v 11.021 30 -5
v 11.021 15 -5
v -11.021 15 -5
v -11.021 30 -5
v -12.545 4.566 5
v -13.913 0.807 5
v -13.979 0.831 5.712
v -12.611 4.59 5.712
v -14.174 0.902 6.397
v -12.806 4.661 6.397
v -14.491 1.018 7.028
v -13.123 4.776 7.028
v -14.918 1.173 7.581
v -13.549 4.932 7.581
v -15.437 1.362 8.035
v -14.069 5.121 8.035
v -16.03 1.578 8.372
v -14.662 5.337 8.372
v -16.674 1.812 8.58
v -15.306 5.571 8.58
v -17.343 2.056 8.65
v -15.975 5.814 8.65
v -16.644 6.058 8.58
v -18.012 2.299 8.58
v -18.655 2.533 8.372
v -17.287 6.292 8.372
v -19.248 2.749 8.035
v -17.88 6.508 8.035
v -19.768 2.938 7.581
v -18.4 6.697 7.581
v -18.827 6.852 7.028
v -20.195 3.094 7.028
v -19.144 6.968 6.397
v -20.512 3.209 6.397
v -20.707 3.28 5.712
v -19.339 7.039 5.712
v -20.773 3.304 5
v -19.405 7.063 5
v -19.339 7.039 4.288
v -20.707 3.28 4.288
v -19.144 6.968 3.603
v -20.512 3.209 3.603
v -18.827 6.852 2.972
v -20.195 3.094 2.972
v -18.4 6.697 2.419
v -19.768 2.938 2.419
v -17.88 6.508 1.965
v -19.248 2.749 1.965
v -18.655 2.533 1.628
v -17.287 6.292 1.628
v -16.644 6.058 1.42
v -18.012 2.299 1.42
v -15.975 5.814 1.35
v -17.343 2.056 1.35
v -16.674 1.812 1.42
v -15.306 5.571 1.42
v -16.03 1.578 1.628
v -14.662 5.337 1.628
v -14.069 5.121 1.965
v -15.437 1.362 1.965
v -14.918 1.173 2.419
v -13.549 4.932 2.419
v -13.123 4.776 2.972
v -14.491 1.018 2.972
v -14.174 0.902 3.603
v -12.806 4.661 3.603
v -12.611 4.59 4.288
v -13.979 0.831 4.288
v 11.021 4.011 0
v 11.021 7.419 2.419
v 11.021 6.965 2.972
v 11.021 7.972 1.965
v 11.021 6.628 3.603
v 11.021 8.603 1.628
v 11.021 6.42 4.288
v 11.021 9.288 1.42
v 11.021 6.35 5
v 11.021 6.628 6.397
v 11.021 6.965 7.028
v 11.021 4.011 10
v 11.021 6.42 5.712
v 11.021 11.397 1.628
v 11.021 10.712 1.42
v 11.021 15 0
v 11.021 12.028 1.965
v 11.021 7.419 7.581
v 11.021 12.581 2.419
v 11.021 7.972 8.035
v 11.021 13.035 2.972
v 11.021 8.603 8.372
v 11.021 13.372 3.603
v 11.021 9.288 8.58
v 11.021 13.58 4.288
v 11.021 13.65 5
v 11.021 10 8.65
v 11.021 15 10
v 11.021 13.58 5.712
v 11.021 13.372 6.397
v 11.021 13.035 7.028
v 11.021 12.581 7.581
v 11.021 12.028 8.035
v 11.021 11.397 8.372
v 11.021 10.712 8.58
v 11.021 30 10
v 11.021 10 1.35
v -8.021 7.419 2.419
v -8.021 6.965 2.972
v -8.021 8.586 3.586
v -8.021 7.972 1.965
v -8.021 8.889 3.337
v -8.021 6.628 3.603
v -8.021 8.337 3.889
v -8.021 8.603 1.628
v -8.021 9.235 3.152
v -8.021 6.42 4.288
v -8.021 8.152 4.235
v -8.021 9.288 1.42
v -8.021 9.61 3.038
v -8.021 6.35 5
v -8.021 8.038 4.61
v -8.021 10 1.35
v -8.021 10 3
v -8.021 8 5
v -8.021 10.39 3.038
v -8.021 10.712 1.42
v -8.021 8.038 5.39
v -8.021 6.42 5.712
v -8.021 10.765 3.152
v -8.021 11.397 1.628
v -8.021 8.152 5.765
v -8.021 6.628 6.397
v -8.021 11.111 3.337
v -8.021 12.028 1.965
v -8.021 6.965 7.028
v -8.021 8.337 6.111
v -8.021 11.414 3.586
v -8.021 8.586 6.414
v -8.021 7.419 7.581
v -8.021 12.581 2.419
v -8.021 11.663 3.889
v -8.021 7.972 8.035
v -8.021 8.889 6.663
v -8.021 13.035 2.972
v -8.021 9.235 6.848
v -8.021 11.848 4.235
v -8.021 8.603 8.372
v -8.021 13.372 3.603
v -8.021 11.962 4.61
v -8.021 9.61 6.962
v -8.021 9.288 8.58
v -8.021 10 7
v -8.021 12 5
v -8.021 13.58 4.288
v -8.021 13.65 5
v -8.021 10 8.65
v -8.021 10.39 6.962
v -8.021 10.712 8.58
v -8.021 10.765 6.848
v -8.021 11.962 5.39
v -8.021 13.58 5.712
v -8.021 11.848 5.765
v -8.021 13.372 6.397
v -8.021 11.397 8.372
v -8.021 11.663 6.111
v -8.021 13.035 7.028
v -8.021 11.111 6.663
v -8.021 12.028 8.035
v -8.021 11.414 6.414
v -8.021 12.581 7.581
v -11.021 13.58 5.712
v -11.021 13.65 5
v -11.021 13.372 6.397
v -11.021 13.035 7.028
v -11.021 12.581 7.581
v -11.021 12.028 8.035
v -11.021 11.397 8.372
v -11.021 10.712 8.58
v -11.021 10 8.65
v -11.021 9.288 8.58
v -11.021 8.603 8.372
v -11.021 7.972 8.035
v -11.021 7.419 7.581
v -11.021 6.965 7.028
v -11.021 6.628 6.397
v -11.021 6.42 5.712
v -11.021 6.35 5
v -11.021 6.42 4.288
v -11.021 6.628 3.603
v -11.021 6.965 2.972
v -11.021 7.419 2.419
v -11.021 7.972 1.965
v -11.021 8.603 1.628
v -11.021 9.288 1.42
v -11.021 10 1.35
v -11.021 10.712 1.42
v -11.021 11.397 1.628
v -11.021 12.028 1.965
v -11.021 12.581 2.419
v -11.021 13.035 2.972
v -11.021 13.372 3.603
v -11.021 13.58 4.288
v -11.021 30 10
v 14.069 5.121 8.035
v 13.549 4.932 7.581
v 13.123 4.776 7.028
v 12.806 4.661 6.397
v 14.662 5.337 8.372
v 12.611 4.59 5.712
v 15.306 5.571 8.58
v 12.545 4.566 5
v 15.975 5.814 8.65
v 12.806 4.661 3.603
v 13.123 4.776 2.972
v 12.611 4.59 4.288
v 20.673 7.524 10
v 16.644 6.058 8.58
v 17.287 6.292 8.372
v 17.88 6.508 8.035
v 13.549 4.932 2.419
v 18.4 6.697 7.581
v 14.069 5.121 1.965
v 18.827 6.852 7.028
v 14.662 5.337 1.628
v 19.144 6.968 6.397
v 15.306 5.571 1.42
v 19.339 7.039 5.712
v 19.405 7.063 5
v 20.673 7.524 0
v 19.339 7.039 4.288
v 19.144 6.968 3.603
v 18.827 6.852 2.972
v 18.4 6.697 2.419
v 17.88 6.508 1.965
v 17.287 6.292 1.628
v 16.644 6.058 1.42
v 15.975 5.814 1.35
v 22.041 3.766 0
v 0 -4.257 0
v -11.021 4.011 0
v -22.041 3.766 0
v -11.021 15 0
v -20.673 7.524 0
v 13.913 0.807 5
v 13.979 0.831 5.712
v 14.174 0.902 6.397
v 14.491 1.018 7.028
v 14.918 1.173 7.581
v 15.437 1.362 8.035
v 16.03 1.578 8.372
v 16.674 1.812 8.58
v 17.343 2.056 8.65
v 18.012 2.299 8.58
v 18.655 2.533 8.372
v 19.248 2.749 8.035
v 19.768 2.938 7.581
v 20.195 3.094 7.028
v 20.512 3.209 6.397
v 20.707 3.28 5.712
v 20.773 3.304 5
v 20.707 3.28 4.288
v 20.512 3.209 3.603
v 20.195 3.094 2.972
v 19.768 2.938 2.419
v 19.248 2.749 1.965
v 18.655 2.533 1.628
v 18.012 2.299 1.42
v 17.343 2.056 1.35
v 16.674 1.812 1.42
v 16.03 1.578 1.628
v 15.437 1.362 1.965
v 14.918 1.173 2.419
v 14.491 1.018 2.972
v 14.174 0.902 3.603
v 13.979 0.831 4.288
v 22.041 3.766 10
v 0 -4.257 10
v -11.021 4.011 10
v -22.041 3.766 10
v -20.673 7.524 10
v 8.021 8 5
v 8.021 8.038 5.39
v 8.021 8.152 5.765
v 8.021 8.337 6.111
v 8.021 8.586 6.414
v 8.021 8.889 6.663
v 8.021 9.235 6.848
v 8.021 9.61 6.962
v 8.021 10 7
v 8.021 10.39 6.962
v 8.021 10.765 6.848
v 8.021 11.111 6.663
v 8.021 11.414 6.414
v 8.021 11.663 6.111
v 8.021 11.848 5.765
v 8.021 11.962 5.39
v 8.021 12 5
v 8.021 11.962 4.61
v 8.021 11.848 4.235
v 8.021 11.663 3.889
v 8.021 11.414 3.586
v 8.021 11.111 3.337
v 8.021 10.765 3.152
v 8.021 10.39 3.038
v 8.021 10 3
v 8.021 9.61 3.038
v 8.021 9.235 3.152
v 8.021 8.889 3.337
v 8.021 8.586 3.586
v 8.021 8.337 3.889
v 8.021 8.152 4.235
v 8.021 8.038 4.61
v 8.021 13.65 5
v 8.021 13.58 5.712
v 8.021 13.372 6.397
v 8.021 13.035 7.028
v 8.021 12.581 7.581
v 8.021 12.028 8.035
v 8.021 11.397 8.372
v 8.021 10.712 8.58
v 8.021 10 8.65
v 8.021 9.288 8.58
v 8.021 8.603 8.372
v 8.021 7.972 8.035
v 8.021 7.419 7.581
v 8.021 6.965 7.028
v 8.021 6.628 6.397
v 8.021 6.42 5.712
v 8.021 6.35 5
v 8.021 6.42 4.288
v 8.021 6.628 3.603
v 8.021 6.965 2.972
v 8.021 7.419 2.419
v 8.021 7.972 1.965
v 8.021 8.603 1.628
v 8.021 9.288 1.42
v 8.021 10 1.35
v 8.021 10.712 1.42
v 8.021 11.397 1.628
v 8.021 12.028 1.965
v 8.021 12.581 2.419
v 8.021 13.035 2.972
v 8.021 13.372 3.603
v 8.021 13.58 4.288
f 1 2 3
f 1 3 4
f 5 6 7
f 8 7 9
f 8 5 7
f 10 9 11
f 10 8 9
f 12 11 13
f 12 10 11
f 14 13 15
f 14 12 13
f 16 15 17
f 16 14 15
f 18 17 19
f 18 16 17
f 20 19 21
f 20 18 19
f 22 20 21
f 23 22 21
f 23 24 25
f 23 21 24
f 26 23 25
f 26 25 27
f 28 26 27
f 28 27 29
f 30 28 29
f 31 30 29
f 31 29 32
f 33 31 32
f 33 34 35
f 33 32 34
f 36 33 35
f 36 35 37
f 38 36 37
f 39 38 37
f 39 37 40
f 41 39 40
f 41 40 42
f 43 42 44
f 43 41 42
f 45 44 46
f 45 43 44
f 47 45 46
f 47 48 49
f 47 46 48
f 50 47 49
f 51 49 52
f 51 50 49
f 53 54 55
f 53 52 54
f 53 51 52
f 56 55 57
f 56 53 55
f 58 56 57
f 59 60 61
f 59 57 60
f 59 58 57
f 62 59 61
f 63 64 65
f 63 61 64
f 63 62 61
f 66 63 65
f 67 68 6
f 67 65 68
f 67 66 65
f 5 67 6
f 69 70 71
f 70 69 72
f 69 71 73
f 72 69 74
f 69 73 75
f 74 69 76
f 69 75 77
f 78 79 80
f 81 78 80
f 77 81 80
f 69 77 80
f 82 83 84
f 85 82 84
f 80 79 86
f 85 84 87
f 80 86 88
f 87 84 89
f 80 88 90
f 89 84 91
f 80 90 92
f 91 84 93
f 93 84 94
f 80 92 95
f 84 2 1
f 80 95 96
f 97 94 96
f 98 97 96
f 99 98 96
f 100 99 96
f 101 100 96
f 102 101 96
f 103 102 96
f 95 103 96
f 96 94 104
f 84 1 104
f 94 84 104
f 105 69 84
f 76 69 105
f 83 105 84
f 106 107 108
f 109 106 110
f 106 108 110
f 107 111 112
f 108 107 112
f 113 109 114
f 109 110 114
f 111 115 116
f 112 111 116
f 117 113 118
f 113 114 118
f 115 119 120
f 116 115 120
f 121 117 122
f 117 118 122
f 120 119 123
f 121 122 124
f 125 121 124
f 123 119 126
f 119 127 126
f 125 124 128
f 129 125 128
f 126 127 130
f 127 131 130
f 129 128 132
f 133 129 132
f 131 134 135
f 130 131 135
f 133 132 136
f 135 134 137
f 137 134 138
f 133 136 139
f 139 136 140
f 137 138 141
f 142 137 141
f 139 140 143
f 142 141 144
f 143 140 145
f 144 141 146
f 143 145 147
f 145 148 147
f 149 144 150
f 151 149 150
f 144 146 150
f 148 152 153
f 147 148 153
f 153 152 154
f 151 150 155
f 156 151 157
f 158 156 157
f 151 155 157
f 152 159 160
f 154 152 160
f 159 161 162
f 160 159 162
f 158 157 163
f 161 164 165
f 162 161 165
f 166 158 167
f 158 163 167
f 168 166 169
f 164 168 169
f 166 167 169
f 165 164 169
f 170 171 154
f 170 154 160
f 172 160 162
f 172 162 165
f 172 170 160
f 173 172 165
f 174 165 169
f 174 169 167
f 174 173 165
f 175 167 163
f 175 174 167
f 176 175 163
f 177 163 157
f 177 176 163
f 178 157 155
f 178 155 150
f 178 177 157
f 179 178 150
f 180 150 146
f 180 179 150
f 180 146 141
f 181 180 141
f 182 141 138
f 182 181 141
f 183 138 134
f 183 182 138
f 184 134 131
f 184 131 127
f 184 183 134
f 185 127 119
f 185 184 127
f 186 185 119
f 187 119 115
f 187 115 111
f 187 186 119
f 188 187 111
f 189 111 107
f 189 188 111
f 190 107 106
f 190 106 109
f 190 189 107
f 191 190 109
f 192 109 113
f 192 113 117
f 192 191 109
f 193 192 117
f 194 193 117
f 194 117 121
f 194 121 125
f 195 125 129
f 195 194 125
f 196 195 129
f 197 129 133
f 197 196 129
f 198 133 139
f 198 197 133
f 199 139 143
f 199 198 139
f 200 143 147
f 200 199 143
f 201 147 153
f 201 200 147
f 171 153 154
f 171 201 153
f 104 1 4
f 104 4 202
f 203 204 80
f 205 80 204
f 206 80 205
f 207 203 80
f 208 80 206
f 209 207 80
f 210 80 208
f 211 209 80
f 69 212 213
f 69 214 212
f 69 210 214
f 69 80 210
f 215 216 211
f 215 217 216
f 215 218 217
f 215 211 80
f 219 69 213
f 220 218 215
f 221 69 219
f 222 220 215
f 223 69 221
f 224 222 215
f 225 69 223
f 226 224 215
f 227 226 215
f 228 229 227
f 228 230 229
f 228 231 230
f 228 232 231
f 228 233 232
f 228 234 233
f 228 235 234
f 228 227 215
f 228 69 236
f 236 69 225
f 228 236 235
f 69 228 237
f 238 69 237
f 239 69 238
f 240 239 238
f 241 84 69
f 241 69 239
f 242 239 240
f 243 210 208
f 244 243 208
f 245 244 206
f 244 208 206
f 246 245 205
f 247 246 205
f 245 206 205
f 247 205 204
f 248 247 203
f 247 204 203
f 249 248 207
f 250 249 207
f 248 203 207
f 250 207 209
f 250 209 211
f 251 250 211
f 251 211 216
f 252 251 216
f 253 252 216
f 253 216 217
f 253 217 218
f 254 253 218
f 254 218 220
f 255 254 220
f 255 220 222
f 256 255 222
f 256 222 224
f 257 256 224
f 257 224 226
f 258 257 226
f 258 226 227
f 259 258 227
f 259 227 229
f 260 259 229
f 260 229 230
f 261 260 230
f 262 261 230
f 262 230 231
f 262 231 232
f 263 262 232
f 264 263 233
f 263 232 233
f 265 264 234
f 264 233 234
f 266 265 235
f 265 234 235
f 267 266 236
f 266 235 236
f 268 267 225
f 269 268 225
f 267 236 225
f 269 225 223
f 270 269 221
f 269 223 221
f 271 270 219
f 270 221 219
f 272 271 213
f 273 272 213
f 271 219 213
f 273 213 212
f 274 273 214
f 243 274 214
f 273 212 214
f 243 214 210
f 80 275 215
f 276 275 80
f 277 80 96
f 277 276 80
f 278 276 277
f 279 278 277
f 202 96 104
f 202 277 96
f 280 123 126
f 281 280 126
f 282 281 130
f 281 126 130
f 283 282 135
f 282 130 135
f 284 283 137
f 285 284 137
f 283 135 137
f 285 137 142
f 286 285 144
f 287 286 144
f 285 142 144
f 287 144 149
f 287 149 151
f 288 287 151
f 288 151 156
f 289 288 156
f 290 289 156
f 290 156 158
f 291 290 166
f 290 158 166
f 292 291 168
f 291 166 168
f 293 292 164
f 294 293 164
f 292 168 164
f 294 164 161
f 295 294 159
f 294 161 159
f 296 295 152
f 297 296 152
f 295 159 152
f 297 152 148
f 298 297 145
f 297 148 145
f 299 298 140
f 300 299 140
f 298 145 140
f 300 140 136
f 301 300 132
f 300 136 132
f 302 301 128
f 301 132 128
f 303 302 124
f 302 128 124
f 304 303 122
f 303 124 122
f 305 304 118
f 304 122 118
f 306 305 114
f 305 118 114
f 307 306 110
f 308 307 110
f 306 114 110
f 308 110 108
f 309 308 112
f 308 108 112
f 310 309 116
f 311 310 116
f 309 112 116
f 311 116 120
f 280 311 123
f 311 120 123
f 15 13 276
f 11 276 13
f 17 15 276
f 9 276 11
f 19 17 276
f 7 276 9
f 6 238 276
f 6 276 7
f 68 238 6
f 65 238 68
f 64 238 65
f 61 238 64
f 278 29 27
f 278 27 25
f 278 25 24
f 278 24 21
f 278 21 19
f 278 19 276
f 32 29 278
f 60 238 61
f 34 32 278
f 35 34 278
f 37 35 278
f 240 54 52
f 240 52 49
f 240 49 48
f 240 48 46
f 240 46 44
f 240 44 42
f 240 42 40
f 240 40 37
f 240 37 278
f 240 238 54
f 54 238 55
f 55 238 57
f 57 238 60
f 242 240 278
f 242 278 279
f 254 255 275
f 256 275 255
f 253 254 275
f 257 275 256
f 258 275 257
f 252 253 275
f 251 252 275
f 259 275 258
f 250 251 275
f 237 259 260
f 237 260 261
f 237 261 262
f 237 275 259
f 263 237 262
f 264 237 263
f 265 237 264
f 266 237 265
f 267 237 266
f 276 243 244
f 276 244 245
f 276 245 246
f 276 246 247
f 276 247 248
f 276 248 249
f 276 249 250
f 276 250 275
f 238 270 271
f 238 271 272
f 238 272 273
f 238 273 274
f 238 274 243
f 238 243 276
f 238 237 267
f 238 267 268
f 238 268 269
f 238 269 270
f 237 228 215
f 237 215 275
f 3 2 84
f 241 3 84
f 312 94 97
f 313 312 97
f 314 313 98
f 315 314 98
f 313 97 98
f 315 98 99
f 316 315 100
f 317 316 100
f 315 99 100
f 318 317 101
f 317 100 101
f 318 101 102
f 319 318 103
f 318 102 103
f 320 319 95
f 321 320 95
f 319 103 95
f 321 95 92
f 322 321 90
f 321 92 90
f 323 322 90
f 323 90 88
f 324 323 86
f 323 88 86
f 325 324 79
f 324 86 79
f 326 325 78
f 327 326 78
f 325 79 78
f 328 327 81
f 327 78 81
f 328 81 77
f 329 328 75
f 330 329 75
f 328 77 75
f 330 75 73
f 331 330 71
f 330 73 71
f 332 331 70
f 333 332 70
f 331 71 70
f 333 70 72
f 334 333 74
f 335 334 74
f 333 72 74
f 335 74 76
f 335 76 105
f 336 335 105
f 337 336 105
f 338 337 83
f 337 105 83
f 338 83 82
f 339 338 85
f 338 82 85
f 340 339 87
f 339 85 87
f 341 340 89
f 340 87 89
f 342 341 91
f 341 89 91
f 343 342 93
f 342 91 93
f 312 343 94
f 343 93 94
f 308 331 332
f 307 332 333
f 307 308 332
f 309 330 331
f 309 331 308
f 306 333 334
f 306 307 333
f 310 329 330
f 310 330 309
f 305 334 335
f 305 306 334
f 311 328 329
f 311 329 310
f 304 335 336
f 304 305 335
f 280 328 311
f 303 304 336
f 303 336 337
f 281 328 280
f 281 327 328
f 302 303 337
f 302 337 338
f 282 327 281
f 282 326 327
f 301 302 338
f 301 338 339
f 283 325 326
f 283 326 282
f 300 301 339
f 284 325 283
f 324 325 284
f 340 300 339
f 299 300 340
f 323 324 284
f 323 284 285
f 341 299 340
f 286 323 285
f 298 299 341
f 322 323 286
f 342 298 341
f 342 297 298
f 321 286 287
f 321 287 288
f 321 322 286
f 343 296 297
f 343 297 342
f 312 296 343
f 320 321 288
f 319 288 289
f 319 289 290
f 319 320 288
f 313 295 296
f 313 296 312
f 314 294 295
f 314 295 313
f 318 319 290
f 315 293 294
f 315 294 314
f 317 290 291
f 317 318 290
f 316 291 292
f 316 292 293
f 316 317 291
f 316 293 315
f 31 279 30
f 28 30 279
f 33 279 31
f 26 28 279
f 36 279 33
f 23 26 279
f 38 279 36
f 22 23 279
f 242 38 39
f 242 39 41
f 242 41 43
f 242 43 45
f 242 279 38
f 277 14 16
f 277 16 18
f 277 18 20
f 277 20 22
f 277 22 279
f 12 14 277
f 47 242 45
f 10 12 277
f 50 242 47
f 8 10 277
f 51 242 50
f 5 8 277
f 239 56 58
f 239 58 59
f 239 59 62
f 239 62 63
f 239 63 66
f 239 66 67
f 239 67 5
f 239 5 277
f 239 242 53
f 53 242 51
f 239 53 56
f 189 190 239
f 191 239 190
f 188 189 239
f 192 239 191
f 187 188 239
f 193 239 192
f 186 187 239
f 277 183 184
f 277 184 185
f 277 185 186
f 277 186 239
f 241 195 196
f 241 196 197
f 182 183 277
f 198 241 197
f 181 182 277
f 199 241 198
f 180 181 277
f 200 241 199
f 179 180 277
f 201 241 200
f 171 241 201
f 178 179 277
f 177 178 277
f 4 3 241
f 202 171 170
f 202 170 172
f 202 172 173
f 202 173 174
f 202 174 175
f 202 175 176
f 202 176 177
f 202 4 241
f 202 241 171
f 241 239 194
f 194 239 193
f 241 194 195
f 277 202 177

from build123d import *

# Parameters (mm, degrees)
BOSS_EXTRUDE1_DEPTH = 10
SKETCH2_R           = 3.65
CUT_EXTRUDE1_DEPTH  = 16.423609234
BOSS_EXTRUDE3_DEPTH = 10
SKETCH6_R           = 3.65
CUT_EXTRUDE4_DEPTH  = 3
SKETCH8_R           = 2
CUT_EXTRUDE5_DEPTH  = 16.041318231
SKETCH9_W           = 15
SKETCH9_H           = 15
BOSS_EXTRUDE4_DEPTH = 22.041318231


with BuildPart() as part:
    # Sketch1 → Boss-Extrude1 (new body)
    with BuildSketch(Plane.XY):
        Polygon((0, 0), (20.673237657, 7.524443153), (22.041318231, 3.76567267), (0, -4.25671109), (-22.041318231, 3.76567267), (-20.673237657, 7.524443153), align=None)
    extrude(amount=BOSS_EXTRUDE1_DEPTH)

    # Sketch2 → Cut-Extrude1 (cut)
    with BuildSketch(Plane(origin=(0, 0, 0), x_dir=(0.9396926207859093, 0.34202014332566627, 0), z_dir=(-0.34202014332566627, 0.9396926207859093, 0))):
        with Locations(Location((17, -5, 0), (0, 0, 180))):
            Circle(SKETCH2_R)
    cut_extrude1 = extrude(amount=-CUT_EXTRUDE1_DEPTH, mode=Mode.SUBTRACT)

    # Mirror1: Cut-Extrude1 across plane
    add(cut_extrude1.mirror(Plane(origin=(0, 0, 0), x_dir=(0, 0, 1), z_dir=(1, 0, 0))), mode=Mode.SUBTRACT)

    # Sketch3 → Boss-Extrude3 (add)
    with BuildSketch(Plane.XY.offset(10)):
        Polygon((0, -4.25671109), (-11.020659115, -0.24551921), (-11.020659115, 15), (11.020659115, 15), (11.020659115, -0.24551921), align=None)
    extrude(amount=-BOSS_EXTRUDE3_DEPTH)

    # Sketch6 → Cut-Extrude4 (cut)
    with BuildSketch(Plane(origin=(11.020659115, 0, 0), x_dir=(0, 0, -1), z_dir=(1, 0, 0))):
        with Locations(Location((-5, 10, 0), (0, 0, 90))):
            Circle(SKETCH6_R)
    cut_extrude4 = extrude(amount=-CUT_EXTRUDE4_DEPTH, mode=Mode.SUBTRACT)

    # Mirror3: Cut-Extrude4 across plane
    add(cut_extrude4.mirror(Plane(origin=(0, 0, 0), x_dir=(0, 0, 1), z_dir=(1, 0, 0))), mode=Mode.SUBTRACT)

    # Sketch8 → Cut-Extrude5 (cut)
    with BuildSketch(Plane.ZY.offset(8.020659115)):
        with Locations(Location((5, 10, 0), (0, 0, 270))):
            Circle(SKETCH8_R)
    extrude(amount=-CUT_EXTRUDE5_DEPTH, mode=Mode.SUBTRACT)

    # Sketch9 → Boss-Extrude4 (add)
    with BuildSketch(Plane.ZY.offset(11.020659115)):
        with Locations((2.5, 22.5)):
            Rectangle(SKETCH9_W, SKETCH9_H)
    extrude(amount=-BOSS_EXTRUDE4_DEPTH)


solid = part.part
